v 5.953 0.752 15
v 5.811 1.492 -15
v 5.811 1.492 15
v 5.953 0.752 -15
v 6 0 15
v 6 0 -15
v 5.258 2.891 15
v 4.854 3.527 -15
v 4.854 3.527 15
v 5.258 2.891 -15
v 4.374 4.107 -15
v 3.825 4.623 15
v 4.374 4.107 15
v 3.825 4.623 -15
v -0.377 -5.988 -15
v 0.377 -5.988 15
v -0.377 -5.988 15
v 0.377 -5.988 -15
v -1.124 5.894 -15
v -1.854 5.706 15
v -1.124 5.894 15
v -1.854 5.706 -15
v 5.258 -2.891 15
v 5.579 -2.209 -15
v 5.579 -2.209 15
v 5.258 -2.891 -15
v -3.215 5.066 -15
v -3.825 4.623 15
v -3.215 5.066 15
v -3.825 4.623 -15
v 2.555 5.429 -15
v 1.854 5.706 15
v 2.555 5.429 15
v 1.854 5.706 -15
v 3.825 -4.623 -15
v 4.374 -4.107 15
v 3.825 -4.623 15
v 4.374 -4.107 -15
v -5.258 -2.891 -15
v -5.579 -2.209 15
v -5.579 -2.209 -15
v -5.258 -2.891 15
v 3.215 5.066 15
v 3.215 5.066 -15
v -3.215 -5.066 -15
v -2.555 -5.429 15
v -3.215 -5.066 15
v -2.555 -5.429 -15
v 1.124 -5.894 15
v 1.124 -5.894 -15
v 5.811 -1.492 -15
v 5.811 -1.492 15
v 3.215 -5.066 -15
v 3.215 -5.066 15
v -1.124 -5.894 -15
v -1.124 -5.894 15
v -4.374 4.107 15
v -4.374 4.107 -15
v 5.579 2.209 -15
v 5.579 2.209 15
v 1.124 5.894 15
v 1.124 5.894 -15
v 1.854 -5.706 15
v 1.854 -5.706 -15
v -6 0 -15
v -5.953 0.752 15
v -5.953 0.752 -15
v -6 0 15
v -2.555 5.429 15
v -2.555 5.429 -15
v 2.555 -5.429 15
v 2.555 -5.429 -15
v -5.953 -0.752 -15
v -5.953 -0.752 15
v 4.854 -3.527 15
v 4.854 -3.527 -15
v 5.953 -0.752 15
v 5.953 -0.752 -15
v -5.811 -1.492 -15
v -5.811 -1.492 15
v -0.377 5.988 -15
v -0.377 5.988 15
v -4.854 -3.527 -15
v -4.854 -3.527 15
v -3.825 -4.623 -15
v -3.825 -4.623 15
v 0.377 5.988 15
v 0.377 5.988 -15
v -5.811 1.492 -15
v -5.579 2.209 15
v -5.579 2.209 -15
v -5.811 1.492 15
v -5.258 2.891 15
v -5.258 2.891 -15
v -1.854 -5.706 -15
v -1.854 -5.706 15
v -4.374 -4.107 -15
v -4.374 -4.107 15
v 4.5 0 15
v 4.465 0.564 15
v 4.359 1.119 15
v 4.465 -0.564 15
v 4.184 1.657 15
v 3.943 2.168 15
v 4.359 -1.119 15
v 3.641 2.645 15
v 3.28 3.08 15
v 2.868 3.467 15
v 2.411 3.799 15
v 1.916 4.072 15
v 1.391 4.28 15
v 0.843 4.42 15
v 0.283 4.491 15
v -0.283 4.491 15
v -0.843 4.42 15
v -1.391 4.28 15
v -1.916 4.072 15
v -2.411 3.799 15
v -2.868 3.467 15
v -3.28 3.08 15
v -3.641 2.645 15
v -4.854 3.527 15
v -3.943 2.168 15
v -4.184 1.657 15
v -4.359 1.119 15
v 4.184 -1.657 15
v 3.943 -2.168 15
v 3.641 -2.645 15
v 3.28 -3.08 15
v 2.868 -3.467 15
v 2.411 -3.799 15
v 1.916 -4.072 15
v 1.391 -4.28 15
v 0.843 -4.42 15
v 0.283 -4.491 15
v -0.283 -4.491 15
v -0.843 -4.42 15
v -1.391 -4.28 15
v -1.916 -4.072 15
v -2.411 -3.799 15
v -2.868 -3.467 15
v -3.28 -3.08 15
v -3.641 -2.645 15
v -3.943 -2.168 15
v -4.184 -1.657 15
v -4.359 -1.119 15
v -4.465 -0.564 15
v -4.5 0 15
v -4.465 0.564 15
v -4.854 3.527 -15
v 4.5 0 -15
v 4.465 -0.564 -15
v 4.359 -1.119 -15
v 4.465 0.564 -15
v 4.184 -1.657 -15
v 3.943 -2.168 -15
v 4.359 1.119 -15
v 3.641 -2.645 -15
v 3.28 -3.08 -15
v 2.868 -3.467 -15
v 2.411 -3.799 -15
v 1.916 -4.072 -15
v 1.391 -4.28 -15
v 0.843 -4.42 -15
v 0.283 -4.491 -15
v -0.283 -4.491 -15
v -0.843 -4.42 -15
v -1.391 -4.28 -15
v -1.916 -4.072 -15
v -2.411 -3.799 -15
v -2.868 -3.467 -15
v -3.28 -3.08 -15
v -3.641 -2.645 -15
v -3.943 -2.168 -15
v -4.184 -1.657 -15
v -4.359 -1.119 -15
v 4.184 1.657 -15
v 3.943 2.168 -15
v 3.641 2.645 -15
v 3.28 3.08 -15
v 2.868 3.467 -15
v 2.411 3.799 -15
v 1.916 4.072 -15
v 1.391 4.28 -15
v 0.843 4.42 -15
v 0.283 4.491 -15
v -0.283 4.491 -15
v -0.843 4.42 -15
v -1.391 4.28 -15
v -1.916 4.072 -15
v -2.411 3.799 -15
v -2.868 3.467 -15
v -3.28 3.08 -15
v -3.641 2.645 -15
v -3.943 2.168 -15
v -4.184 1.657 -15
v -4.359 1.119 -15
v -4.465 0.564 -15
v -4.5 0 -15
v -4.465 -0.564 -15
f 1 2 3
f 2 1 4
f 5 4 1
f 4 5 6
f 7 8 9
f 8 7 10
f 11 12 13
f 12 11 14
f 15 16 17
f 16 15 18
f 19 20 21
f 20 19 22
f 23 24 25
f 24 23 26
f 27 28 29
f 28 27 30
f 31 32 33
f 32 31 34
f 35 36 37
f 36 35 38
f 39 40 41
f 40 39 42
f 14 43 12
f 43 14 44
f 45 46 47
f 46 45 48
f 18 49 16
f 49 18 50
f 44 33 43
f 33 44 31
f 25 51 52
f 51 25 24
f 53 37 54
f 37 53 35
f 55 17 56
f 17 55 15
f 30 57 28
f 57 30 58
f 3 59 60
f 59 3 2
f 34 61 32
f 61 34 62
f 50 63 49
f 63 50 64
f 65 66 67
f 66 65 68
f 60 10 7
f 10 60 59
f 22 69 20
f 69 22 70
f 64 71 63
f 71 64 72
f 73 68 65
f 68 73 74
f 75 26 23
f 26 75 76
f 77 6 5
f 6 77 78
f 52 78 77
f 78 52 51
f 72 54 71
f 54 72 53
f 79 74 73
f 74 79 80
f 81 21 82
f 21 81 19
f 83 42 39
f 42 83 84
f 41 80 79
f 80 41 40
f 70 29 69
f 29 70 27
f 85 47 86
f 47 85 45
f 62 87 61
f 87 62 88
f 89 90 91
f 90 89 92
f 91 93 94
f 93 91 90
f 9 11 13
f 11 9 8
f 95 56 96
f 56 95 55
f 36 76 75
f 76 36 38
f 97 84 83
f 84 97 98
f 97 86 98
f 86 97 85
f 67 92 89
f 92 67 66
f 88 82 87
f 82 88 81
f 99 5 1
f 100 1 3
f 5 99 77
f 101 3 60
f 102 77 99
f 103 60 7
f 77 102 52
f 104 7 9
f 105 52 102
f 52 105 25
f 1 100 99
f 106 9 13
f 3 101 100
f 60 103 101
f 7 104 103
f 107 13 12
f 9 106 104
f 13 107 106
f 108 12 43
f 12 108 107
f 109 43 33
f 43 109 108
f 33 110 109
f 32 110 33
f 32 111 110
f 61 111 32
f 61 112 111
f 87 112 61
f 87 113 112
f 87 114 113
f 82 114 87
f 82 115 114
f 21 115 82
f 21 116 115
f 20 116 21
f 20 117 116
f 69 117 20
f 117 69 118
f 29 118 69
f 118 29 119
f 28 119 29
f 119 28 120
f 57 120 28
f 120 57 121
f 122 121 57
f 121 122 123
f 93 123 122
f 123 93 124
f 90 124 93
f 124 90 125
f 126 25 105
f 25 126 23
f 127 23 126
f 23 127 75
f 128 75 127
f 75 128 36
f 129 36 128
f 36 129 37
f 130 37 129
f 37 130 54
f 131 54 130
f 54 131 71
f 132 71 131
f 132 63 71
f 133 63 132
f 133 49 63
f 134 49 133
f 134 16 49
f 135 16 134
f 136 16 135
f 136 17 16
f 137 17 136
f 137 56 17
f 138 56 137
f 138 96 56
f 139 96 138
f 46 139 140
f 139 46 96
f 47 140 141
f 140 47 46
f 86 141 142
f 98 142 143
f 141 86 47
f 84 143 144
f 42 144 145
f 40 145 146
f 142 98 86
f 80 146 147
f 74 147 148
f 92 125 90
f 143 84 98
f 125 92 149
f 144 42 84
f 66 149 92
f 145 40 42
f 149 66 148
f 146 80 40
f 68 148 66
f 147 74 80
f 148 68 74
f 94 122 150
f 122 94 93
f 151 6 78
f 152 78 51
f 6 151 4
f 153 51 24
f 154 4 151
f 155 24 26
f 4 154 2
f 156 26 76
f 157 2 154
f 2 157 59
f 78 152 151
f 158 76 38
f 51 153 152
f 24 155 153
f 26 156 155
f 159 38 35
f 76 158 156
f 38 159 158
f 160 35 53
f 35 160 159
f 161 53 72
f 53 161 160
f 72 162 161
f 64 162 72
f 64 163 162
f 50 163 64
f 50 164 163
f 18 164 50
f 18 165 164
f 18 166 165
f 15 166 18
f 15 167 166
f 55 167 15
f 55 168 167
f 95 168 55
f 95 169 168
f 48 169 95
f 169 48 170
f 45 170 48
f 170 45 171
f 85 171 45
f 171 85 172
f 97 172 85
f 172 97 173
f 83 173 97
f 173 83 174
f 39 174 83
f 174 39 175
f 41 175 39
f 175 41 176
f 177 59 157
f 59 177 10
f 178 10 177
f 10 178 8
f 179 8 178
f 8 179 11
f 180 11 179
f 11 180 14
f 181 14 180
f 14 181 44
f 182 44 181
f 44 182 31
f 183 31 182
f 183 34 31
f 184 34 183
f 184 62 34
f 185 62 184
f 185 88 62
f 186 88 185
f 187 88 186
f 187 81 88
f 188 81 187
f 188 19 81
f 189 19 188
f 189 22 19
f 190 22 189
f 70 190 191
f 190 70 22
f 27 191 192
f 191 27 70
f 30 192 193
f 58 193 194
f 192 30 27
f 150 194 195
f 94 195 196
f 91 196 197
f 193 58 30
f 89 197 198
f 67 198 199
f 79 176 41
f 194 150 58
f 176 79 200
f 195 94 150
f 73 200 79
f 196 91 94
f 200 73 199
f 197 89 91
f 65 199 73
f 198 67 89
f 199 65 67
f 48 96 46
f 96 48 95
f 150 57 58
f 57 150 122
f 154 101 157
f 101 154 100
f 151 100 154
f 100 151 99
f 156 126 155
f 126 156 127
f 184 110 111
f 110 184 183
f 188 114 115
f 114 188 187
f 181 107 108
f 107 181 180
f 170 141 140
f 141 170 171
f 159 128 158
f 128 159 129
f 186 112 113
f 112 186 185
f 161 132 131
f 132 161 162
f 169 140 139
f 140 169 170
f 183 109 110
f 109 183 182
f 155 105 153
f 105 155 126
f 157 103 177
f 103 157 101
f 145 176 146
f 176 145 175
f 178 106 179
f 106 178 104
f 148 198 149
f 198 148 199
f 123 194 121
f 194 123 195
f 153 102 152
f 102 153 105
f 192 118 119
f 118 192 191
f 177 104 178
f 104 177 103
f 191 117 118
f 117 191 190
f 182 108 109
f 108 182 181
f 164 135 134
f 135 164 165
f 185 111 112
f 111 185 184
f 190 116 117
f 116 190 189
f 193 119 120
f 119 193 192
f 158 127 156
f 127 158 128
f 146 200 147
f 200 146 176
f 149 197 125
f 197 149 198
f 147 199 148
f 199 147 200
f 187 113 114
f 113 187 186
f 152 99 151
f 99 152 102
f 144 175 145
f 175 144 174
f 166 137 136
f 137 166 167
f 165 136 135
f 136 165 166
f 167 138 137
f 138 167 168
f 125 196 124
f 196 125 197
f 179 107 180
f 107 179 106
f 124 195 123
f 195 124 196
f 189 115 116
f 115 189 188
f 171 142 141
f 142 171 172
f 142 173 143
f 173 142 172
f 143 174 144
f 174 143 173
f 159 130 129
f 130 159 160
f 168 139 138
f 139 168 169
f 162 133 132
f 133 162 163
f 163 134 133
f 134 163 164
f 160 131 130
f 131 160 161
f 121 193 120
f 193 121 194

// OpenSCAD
$fn = 50;


difference() {
	union() {
		translate(v = [0, 0, -15.0000000000]) {
			cylinder(h = 30, r = 6.0000000000);
		}
	}
	union() {
		translate(v = [0, 0, -100.0000000000]) {
			cylinder(h = 200, r = 4.5000000000);
		}
	}
}
